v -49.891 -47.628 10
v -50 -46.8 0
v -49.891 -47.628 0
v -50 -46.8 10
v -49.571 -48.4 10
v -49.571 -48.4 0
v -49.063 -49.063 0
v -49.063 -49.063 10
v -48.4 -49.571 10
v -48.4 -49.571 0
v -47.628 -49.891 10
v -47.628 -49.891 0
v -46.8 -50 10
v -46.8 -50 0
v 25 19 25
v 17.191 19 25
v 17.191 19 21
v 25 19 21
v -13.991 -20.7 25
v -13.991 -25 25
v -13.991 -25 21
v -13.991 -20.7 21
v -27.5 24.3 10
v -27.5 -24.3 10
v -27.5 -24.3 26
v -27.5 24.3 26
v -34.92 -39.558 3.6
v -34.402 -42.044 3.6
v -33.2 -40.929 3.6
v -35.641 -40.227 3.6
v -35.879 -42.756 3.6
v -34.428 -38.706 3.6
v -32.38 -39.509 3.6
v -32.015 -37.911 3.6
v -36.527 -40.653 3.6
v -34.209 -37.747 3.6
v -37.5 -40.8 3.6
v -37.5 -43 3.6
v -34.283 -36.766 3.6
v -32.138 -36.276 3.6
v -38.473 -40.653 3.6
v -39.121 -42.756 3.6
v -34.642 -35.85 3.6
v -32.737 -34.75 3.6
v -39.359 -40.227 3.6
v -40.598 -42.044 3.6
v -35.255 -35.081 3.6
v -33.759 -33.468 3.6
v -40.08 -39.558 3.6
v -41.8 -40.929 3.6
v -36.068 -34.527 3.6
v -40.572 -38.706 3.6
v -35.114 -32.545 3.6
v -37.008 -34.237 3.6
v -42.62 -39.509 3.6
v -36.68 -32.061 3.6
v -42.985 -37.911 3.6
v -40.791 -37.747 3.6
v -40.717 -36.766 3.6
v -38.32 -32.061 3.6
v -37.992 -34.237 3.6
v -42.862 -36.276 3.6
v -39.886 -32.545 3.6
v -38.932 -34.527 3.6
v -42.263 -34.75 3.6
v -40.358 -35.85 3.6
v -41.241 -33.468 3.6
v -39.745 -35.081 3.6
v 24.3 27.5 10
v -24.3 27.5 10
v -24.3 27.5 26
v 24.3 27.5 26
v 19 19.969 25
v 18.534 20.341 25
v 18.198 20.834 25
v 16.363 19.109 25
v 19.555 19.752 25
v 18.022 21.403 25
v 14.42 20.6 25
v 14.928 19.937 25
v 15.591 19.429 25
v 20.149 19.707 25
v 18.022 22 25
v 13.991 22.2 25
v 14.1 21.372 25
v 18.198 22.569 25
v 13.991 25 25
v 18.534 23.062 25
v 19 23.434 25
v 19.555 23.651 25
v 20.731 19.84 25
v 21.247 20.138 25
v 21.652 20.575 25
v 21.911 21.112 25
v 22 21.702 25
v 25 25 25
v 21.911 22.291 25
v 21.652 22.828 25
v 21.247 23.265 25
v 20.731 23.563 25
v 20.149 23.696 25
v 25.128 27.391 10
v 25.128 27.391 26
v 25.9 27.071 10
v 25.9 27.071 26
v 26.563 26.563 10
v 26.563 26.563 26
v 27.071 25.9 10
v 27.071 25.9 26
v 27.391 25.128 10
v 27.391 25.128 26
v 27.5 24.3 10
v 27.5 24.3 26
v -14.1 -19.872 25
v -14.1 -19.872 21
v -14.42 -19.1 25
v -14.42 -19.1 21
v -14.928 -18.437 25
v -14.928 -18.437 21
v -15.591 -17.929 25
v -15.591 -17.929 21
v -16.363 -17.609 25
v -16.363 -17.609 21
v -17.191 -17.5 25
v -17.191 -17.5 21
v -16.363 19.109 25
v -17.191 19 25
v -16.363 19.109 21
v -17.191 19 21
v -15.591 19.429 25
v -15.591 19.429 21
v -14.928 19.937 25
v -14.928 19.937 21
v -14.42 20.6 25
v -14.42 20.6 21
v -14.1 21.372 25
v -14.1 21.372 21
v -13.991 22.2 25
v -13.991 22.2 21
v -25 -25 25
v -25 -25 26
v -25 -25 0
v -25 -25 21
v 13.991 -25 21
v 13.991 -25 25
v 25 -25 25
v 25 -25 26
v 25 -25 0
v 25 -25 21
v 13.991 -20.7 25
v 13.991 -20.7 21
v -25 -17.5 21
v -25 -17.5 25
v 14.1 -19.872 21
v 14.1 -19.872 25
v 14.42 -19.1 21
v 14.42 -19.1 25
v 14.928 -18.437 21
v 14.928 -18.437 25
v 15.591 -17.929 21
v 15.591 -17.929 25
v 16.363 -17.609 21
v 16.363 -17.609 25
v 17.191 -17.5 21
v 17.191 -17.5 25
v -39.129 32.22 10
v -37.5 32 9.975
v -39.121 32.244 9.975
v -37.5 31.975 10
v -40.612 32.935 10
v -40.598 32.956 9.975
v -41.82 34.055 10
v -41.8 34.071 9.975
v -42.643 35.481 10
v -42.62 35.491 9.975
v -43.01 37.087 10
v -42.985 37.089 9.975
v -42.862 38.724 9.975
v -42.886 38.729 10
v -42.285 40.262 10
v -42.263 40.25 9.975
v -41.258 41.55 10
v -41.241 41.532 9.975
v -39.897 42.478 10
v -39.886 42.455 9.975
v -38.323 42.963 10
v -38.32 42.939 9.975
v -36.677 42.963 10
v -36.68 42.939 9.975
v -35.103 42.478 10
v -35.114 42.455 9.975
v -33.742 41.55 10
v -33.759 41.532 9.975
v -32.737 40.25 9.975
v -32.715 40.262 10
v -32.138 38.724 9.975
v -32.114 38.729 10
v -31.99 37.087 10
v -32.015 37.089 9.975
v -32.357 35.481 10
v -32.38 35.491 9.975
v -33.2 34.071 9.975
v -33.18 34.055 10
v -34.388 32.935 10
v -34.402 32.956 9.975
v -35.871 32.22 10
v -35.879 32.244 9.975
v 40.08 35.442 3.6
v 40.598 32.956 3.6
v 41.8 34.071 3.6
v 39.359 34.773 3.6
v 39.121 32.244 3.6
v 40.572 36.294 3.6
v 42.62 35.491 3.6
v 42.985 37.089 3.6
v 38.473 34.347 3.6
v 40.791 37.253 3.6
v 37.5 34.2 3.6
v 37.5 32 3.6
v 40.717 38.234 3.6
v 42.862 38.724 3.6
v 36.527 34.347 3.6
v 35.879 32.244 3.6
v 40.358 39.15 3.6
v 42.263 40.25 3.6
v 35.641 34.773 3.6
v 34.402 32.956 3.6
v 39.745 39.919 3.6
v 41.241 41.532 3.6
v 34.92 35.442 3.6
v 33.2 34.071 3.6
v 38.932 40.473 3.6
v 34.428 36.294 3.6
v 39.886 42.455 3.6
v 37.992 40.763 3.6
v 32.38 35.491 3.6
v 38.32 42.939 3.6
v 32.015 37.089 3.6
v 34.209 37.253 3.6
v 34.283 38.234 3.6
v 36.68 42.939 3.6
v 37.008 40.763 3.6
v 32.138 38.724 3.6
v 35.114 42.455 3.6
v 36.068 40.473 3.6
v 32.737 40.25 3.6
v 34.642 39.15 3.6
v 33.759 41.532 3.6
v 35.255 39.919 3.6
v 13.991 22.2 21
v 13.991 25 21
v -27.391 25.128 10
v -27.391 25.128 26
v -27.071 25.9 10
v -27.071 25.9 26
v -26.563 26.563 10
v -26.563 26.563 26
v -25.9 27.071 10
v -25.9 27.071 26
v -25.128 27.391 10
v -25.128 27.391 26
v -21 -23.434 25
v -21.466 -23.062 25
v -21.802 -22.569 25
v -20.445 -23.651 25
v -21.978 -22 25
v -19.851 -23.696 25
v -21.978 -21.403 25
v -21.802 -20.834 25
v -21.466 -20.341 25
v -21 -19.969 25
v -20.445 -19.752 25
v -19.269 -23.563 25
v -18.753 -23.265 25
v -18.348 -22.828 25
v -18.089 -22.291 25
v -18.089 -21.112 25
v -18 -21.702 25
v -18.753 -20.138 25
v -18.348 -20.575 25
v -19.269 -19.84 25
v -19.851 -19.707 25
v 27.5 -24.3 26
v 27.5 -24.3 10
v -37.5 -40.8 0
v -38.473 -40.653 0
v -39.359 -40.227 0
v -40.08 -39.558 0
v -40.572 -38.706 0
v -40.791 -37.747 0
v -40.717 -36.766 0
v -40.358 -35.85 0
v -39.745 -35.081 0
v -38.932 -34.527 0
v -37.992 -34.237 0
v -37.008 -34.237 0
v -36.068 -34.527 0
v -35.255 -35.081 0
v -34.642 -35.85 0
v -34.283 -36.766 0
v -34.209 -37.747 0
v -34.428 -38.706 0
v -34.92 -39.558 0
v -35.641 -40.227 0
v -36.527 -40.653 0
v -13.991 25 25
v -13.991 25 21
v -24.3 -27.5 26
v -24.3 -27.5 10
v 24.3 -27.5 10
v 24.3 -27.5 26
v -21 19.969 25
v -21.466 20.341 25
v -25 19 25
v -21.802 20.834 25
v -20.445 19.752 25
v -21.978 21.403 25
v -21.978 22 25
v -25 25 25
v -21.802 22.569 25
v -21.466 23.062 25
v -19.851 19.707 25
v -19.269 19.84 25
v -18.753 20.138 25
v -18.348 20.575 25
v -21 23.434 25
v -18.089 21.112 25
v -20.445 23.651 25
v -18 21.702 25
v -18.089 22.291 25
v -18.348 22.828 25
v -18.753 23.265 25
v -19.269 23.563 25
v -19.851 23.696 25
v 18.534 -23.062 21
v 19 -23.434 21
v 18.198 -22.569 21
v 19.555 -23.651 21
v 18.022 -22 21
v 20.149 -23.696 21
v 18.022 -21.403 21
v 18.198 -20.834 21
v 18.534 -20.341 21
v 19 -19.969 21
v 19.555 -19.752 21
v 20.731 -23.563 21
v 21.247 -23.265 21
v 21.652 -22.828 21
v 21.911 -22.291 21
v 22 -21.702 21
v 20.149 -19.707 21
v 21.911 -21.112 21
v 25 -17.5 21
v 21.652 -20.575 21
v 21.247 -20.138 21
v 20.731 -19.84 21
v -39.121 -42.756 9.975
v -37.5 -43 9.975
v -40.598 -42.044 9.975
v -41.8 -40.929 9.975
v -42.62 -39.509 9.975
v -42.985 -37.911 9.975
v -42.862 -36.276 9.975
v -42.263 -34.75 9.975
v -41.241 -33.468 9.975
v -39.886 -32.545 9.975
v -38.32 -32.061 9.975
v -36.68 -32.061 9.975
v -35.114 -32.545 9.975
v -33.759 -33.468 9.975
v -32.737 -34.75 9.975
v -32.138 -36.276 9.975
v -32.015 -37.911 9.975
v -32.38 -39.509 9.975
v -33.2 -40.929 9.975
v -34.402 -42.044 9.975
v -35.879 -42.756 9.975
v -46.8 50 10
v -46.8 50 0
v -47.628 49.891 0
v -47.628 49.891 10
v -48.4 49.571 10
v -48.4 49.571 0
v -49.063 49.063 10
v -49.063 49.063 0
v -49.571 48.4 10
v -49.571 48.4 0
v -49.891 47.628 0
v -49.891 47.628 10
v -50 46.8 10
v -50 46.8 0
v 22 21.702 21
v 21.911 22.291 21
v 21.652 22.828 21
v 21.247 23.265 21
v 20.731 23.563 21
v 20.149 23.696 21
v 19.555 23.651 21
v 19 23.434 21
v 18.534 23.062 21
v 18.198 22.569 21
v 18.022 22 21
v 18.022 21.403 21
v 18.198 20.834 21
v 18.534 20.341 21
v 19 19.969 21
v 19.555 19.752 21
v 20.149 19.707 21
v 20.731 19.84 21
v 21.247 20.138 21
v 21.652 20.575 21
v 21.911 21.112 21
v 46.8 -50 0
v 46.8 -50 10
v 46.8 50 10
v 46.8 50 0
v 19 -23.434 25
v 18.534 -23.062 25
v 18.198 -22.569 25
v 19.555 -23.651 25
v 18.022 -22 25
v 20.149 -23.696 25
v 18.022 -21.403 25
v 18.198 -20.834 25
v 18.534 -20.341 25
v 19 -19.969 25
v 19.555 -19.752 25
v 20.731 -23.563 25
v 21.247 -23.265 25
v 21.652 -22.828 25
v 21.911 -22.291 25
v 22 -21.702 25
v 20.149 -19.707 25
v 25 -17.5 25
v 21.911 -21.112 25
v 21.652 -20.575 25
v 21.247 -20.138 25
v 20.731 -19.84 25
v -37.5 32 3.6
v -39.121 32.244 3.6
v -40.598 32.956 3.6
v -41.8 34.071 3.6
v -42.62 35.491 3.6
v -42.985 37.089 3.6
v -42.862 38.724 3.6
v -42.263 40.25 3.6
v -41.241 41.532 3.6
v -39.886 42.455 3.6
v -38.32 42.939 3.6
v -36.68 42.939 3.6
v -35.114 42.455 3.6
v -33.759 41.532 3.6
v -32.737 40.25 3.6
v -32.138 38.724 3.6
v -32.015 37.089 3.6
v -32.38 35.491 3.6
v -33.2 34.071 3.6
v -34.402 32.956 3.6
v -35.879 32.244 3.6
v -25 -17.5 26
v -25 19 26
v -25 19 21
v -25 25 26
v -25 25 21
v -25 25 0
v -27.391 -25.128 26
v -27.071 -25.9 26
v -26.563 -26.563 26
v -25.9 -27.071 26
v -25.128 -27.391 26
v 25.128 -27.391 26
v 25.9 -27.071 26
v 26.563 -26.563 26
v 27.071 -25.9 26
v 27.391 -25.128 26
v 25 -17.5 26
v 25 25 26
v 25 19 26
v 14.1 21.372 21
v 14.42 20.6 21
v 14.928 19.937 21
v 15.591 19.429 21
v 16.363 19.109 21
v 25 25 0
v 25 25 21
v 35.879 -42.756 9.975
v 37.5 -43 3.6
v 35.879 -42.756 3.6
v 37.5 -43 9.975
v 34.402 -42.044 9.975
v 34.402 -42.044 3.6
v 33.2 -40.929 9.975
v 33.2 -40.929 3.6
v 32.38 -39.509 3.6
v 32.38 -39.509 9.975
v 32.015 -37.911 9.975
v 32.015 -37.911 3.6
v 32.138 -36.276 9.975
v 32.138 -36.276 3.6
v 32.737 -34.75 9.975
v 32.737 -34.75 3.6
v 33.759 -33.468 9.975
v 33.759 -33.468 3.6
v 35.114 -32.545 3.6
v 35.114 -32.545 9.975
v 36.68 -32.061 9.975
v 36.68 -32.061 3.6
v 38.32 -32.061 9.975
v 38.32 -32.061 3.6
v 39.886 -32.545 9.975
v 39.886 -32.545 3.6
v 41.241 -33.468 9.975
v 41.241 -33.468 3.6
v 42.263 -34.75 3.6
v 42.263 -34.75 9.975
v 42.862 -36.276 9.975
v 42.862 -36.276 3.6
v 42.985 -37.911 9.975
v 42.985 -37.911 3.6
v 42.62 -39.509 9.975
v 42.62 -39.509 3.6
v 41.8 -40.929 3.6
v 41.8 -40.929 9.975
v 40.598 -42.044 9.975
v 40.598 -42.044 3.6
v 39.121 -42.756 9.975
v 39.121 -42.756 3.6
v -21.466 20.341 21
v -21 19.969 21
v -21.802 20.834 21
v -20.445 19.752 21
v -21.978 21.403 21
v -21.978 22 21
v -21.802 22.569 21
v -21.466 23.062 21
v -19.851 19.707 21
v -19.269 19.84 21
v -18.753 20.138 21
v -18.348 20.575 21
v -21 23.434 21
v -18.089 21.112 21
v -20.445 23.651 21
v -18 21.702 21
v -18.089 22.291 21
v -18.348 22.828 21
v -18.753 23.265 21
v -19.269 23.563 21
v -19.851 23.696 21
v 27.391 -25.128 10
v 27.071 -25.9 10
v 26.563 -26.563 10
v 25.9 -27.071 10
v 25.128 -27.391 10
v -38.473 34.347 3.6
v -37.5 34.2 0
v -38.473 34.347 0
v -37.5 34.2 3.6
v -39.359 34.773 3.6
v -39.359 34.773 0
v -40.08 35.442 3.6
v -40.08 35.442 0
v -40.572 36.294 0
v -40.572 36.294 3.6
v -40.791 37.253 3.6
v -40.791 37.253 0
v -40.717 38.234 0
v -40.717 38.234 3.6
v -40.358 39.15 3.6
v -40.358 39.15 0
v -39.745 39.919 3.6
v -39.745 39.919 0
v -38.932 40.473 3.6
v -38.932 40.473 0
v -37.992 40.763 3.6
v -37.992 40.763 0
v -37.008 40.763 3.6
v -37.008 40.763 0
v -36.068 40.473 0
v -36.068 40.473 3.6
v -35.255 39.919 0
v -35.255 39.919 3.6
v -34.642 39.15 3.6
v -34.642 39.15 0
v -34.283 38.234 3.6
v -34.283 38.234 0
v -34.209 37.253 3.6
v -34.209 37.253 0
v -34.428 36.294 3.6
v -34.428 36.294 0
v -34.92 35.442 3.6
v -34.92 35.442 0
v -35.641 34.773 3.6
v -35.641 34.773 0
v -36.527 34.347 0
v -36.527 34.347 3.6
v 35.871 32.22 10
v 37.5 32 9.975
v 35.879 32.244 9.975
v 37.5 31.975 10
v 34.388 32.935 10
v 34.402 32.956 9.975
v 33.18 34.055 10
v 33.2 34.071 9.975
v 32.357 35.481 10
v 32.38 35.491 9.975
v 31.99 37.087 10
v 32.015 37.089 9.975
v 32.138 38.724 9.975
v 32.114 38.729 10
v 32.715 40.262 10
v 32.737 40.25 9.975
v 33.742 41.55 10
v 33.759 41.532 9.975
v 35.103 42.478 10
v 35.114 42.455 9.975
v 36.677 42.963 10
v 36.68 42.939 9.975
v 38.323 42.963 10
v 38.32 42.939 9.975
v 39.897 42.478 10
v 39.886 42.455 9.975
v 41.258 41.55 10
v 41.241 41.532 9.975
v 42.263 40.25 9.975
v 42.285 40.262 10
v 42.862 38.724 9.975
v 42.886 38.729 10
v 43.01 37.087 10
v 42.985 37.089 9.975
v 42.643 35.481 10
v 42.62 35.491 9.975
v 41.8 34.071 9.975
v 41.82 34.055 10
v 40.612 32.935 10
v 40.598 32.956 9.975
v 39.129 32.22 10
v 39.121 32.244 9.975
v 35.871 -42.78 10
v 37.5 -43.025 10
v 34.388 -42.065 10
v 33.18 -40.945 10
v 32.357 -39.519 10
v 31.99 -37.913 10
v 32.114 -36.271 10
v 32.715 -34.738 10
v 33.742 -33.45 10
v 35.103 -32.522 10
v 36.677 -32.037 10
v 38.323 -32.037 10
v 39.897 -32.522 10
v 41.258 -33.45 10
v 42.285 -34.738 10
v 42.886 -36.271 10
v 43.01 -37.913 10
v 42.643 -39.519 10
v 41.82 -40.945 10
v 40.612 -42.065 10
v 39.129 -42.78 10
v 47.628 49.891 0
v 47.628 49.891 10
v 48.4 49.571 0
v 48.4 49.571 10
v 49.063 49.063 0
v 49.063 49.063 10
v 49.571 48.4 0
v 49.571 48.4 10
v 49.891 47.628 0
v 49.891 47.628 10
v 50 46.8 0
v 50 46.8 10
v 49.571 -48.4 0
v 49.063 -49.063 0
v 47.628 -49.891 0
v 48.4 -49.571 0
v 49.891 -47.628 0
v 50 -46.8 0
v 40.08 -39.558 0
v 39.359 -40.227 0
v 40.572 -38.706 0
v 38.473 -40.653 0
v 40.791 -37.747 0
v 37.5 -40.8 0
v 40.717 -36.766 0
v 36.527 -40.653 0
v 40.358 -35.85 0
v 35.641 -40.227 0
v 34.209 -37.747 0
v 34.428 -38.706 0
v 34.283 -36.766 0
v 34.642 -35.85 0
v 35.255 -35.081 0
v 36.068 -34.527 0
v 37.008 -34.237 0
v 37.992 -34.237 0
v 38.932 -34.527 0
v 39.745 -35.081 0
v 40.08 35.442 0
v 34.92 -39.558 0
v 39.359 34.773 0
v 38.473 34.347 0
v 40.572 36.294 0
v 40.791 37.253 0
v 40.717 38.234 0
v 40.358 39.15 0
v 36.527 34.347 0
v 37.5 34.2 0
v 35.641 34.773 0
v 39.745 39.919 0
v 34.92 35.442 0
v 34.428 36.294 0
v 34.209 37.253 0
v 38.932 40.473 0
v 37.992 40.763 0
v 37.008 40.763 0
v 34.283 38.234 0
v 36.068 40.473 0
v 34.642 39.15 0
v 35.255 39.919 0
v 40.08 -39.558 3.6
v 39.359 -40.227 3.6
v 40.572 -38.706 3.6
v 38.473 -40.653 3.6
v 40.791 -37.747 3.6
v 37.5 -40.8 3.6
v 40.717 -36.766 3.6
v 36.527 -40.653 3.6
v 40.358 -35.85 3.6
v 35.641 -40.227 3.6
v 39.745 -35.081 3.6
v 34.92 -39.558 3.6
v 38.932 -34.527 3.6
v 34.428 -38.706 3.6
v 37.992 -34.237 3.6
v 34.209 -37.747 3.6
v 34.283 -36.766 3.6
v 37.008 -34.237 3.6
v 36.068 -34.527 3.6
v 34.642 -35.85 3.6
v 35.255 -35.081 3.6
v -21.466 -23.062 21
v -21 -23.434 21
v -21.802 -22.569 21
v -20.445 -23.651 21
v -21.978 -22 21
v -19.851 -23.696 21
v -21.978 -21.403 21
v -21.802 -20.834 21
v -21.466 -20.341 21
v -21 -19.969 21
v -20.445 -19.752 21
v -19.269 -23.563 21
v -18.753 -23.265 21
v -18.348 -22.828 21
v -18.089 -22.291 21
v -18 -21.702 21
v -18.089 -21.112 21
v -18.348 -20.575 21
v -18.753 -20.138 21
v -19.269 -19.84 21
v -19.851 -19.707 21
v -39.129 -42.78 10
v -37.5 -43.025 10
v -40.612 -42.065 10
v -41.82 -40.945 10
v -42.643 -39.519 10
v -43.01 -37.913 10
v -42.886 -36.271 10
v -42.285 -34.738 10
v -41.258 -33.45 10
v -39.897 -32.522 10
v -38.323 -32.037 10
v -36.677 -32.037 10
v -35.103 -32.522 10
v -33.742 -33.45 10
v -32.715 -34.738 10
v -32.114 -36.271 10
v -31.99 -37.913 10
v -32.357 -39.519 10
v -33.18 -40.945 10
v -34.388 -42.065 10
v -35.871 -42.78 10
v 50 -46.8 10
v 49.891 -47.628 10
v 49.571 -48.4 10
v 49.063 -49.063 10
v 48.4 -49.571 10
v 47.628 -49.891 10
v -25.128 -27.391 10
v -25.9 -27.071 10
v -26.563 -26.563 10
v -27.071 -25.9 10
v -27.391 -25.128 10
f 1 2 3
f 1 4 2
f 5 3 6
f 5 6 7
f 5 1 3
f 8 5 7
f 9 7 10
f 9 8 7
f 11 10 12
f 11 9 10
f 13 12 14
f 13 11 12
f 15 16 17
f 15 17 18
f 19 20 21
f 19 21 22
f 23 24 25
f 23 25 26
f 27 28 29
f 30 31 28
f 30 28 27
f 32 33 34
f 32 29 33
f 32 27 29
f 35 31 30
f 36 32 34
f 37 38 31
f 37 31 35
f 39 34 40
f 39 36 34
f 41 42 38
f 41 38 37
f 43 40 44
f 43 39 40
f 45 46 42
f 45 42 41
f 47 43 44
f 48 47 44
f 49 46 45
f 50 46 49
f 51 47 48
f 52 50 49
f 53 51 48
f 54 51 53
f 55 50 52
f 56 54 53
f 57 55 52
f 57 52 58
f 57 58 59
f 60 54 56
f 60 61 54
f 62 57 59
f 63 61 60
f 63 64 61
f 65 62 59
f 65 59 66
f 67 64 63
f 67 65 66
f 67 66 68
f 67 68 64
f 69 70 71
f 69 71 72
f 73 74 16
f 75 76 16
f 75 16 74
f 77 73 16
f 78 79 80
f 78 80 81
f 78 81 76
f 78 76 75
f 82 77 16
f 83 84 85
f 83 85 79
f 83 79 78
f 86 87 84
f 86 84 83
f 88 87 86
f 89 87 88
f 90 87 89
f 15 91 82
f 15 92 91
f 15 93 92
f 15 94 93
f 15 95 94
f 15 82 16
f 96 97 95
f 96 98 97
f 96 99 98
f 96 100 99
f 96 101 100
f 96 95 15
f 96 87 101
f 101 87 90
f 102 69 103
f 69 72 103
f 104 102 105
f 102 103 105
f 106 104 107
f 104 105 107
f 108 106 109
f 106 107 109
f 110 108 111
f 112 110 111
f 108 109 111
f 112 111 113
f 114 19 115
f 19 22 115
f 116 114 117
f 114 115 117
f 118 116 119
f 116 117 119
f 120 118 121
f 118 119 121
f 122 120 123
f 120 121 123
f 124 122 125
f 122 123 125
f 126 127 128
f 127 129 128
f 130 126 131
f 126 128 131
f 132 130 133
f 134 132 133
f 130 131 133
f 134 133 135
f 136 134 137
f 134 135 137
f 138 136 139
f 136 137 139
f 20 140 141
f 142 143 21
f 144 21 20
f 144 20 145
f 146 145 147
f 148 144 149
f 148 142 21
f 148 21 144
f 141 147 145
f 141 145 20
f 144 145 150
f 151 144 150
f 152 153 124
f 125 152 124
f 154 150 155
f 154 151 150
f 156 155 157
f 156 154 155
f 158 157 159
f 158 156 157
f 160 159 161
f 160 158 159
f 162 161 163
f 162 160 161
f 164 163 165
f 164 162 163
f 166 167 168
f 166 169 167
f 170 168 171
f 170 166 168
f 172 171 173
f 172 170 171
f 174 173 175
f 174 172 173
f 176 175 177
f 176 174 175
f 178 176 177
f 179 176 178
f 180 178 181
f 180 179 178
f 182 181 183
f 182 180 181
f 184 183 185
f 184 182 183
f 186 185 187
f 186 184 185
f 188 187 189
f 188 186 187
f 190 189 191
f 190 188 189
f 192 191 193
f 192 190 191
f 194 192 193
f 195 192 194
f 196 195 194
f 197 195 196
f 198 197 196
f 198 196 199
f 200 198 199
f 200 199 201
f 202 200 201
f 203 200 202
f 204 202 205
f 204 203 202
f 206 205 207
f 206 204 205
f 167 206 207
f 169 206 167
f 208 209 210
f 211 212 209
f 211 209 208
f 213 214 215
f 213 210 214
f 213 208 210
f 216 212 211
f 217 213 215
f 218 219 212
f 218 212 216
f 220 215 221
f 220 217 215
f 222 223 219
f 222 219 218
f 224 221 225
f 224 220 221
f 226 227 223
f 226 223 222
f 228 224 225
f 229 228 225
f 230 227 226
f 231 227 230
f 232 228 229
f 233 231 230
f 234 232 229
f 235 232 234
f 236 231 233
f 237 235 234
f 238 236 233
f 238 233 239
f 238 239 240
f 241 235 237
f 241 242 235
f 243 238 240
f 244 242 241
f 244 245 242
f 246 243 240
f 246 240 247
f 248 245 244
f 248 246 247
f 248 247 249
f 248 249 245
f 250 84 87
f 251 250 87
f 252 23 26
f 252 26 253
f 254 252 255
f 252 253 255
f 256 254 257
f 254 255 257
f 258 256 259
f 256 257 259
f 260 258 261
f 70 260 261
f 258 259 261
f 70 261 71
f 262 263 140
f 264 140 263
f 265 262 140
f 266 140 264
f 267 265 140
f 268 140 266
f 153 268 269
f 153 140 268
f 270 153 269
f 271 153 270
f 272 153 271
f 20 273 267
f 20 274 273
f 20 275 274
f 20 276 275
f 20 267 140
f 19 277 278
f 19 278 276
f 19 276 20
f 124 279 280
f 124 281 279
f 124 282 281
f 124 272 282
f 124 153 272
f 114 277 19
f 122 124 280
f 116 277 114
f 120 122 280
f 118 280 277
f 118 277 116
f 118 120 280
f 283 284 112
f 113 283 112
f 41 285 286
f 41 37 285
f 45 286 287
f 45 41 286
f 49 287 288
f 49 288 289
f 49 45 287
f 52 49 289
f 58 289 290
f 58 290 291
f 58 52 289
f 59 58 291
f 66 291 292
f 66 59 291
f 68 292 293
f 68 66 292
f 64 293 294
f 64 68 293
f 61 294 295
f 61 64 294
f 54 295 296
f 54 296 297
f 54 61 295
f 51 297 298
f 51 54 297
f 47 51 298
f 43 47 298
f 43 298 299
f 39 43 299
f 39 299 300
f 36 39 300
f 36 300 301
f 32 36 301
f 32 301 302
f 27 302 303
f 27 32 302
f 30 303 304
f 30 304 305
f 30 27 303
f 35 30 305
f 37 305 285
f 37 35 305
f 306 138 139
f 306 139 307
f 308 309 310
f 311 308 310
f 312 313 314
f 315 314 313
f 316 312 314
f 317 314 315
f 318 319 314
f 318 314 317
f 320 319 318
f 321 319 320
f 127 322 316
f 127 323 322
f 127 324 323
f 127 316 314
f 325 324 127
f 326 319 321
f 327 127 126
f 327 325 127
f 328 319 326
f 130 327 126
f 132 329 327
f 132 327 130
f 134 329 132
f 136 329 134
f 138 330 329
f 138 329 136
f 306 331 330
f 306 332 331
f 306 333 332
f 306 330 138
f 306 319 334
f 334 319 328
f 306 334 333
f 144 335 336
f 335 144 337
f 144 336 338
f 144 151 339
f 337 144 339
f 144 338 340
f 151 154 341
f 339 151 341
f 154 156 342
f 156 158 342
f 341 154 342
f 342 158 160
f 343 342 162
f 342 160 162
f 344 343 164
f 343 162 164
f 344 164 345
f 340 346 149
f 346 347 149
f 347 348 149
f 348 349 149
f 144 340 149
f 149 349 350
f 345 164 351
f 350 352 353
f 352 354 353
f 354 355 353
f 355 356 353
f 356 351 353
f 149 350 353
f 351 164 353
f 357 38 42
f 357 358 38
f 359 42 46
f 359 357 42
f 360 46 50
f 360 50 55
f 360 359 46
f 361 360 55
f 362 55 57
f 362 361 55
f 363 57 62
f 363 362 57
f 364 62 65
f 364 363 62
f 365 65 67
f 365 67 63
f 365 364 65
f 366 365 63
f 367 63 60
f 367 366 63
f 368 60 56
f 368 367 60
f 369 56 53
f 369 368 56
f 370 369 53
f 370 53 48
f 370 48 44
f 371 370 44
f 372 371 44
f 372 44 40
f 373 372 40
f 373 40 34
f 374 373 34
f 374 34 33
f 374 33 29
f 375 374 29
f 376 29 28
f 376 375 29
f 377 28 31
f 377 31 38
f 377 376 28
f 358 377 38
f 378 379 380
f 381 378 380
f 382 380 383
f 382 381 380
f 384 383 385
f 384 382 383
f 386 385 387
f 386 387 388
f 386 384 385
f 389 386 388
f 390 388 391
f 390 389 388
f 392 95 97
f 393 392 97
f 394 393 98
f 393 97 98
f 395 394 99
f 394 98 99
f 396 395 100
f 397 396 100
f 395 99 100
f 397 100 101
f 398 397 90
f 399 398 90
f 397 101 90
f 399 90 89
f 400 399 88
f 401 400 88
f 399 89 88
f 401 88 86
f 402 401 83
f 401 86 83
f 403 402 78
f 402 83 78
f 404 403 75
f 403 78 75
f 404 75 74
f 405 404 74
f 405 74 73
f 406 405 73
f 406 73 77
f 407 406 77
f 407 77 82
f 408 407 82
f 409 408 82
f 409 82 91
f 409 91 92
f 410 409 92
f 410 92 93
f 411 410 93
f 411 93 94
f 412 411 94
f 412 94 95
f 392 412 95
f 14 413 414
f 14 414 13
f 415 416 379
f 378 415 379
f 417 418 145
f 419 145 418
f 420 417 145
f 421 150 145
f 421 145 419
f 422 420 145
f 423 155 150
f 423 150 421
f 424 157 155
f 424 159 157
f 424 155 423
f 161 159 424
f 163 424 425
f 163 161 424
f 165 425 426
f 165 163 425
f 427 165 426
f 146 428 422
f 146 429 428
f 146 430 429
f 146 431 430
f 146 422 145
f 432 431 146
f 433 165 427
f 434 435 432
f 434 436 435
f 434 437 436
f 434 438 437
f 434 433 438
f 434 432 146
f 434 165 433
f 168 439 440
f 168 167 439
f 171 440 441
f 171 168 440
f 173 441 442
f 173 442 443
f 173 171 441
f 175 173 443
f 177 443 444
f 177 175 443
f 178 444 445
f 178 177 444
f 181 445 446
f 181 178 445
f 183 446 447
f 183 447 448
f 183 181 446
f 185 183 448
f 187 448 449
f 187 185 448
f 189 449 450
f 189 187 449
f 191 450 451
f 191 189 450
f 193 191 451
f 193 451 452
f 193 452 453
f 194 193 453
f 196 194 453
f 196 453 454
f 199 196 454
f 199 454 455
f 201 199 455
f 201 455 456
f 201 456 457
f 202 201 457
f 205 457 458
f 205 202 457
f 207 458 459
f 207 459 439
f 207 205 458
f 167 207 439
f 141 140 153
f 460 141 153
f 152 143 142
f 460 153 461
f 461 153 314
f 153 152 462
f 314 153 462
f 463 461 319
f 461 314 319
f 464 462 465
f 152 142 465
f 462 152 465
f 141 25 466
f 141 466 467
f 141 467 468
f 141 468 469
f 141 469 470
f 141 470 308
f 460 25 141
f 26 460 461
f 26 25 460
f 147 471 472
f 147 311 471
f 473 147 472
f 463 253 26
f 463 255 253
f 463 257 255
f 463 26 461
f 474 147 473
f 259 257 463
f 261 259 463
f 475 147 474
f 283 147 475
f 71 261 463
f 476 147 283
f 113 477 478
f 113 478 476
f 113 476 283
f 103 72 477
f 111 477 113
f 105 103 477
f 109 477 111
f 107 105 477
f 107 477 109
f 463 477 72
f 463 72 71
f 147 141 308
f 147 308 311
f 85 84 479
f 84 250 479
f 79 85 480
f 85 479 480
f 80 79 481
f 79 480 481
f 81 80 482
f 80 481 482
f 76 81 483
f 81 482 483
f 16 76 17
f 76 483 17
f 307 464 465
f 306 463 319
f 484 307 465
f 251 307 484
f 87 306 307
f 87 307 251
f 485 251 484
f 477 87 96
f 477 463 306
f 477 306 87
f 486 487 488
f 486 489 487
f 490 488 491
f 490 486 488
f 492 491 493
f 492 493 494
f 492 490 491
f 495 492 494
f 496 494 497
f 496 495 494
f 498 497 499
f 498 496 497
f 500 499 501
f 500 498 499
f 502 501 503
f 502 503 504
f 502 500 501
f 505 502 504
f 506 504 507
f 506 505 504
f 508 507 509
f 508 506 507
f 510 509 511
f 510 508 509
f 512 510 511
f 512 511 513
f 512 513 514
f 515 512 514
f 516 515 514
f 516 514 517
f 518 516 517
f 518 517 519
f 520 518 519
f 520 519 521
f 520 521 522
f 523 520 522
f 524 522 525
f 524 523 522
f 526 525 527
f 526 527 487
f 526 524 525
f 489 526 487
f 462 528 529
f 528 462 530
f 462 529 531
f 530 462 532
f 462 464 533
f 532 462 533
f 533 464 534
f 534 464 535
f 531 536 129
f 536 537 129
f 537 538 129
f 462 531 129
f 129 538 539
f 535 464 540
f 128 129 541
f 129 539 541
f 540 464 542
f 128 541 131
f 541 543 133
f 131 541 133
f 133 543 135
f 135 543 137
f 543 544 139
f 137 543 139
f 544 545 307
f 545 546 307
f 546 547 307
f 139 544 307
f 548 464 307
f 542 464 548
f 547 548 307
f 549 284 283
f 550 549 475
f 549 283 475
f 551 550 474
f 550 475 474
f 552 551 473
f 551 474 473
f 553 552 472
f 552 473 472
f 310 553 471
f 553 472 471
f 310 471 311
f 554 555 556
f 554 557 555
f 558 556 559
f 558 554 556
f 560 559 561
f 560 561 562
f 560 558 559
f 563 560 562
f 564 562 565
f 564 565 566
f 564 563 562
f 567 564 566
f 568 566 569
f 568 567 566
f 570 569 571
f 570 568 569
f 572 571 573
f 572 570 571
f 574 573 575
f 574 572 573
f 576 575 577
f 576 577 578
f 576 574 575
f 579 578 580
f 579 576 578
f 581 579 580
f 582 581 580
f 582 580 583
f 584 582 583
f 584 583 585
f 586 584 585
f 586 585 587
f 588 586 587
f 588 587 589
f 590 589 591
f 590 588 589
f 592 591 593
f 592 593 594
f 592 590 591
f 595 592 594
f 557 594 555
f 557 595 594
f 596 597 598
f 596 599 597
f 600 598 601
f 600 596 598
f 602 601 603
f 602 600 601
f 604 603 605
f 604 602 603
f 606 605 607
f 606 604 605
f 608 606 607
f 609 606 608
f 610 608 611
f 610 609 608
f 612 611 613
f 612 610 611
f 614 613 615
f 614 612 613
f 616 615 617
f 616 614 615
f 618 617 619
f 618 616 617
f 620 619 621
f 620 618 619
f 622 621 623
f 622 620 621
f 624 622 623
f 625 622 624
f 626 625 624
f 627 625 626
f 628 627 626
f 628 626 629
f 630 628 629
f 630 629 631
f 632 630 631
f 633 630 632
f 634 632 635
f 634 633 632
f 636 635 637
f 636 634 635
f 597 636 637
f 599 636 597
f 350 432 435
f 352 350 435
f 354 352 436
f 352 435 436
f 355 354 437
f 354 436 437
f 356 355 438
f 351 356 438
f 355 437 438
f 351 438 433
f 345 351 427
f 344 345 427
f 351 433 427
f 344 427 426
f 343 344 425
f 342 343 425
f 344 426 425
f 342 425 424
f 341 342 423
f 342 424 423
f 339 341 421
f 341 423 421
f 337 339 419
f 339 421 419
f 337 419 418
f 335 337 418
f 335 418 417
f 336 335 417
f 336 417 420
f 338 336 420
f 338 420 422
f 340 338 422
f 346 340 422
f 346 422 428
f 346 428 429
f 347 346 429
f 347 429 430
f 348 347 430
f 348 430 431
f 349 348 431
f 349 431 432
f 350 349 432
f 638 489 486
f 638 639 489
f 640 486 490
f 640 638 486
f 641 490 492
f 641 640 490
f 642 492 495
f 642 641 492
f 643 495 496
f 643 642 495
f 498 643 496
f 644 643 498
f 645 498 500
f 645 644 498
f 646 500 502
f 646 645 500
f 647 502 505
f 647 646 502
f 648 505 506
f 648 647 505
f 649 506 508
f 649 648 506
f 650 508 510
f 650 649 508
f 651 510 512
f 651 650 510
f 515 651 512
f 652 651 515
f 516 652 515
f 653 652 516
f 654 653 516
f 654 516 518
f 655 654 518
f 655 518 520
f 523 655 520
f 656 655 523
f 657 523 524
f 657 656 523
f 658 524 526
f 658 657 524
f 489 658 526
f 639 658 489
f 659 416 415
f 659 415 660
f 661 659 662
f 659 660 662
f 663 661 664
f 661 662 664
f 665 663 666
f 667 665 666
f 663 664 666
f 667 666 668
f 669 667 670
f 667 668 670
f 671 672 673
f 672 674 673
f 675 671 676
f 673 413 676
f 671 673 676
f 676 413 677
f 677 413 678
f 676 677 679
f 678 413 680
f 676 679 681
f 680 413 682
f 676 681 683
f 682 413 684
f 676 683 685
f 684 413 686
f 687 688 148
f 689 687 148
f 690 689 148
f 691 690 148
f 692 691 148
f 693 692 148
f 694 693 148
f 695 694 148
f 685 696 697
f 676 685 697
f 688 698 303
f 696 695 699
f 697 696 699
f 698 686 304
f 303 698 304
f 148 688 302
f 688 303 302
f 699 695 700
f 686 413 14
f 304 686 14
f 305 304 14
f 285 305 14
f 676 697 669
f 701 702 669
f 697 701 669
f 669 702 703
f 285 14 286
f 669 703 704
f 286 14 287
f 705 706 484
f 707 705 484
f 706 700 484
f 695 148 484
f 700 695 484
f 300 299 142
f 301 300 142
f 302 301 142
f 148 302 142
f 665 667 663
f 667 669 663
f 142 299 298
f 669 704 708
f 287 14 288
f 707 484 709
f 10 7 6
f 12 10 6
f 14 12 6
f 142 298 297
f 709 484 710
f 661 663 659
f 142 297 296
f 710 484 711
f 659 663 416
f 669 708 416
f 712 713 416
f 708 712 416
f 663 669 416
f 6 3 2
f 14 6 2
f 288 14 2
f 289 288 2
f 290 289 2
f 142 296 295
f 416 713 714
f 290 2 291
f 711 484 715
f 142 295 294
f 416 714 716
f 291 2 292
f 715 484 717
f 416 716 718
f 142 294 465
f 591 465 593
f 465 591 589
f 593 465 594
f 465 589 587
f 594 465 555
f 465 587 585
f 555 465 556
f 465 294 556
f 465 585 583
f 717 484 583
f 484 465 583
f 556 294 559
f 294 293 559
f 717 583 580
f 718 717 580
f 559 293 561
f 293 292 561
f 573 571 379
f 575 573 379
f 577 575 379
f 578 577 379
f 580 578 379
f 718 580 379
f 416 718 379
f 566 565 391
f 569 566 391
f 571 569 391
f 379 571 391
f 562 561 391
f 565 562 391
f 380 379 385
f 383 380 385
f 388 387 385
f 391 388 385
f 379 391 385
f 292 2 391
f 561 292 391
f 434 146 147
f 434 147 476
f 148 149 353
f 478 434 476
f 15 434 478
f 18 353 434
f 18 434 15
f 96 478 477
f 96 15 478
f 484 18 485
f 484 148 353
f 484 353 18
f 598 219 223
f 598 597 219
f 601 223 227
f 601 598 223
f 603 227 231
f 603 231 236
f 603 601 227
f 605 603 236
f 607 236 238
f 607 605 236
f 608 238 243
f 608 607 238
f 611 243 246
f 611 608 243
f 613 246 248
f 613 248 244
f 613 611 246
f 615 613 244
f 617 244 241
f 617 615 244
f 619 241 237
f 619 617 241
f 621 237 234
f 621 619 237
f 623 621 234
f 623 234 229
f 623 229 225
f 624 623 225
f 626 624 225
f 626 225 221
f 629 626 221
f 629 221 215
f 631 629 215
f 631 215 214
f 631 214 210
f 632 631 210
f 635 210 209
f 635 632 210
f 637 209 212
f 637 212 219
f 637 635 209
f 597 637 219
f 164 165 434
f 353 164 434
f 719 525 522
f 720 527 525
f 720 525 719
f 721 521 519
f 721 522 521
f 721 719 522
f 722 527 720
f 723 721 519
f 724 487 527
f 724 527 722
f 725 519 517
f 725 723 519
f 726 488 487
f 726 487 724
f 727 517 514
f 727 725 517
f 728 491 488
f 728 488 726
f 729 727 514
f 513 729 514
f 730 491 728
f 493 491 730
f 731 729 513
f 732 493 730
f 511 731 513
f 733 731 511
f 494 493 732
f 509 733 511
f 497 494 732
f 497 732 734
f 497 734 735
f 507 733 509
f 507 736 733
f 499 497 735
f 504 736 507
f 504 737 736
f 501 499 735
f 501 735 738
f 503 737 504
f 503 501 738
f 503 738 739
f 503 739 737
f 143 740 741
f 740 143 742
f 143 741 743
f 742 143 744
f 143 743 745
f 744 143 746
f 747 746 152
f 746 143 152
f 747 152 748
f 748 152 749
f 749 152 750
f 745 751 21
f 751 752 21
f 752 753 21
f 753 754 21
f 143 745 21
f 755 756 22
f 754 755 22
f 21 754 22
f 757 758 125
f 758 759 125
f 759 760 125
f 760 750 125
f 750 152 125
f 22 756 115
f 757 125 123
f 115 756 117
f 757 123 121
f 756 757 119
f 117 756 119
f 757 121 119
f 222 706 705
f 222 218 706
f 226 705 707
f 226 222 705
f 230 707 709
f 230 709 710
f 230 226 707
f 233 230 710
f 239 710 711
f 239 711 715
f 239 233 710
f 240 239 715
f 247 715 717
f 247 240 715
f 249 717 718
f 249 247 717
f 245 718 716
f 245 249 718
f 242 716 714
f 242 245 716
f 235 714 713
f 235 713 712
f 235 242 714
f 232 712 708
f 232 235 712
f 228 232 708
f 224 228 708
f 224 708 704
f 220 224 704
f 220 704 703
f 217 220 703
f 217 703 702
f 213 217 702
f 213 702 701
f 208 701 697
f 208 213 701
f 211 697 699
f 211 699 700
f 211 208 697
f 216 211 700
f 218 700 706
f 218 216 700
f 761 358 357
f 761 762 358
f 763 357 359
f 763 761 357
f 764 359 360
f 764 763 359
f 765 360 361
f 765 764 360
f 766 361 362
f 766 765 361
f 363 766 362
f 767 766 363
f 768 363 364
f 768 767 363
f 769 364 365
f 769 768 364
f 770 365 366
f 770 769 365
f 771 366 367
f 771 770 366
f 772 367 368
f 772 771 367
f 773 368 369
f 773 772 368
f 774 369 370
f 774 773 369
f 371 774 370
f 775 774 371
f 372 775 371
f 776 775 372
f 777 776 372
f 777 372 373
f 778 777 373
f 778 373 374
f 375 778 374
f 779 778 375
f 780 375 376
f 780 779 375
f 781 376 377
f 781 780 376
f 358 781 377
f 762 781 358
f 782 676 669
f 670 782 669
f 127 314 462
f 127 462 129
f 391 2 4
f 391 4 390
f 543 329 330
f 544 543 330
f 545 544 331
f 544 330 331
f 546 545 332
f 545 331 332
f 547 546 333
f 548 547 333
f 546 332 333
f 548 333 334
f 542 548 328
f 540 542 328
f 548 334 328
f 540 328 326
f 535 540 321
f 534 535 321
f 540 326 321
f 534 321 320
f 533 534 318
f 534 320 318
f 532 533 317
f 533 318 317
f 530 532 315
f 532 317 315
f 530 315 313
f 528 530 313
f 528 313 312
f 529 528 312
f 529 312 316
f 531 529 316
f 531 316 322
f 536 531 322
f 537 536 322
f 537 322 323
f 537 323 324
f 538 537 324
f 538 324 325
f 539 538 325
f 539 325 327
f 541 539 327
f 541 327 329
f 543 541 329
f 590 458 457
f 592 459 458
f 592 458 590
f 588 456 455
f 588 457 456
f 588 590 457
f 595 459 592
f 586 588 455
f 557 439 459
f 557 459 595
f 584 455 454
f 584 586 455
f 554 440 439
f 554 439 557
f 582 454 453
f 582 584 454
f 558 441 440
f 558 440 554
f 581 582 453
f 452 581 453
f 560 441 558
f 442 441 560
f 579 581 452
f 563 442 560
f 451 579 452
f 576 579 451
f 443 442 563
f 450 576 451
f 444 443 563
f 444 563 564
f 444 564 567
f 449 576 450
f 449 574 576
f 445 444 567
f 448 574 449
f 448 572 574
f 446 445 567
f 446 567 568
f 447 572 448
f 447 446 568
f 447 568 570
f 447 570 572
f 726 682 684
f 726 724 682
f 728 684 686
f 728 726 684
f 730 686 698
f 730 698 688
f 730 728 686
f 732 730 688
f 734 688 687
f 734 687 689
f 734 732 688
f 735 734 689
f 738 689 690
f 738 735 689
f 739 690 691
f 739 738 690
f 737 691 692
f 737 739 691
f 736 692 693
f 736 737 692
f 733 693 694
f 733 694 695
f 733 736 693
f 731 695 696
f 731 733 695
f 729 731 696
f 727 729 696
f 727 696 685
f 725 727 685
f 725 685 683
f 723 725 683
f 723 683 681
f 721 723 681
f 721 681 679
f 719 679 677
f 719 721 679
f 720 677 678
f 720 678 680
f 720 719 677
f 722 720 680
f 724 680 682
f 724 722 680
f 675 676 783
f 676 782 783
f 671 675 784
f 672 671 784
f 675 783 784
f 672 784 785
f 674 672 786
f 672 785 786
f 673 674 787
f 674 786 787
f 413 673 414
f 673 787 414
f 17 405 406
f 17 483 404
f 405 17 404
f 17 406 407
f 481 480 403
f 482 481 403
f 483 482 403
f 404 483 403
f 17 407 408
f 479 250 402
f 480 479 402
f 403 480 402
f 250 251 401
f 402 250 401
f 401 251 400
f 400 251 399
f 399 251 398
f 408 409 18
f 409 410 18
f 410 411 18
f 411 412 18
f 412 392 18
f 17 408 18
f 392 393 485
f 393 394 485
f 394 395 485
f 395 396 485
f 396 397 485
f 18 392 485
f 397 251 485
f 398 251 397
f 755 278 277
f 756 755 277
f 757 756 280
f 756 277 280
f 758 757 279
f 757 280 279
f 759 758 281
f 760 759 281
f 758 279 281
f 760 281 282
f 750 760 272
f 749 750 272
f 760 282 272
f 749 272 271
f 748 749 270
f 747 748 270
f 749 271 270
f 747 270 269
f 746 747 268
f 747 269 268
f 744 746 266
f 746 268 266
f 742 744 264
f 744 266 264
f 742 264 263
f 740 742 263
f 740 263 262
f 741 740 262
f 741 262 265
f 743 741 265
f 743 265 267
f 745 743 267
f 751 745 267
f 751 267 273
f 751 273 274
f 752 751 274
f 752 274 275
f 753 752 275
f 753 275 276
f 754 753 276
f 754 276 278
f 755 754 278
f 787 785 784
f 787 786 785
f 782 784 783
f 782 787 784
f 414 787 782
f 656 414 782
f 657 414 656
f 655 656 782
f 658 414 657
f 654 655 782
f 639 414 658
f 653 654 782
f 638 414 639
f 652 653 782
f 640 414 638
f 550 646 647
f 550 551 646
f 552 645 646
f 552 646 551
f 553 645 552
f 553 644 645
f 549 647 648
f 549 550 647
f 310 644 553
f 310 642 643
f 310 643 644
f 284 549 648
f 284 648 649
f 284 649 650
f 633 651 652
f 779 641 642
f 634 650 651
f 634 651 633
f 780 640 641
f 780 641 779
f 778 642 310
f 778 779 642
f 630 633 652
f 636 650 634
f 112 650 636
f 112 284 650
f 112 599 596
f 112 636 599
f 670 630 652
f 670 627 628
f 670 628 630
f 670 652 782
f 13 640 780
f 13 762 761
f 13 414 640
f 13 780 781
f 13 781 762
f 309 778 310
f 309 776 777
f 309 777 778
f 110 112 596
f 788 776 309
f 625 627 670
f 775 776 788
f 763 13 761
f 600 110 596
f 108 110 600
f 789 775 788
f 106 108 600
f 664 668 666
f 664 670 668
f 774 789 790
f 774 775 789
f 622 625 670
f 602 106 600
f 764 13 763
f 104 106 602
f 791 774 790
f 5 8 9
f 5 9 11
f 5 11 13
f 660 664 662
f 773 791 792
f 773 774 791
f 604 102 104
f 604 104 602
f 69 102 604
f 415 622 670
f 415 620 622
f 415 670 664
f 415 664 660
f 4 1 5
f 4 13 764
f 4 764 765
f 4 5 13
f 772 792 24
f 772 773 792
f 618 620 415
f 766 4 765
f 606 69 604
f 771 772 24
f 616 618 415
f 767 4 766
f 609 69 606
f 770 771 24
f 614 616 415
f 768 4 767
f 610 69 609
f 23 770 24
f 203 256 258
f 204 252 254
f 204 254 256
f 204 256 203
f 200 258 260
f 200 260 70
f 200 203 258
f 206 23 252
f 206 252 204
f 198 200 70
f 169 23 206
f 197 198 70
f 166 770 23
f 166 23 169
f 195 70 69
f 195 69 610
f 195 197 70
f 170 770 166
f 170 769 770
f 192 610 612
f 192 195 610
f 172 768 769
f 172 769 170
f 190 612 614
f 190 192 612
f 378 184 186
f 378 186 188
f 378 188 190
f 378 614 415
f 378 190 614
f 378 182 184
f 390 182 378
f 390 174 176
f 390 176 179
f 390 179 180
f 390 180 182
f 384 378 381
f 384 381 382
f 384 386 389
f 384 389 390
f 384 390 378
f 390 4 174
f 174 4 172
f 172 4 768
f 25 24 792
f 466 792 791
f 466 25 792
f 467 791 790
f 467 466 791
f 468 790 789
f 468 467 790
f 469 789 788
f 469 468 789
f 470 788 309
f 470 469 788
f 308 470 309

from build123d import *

# Parameters (mm, degrees)
SKETCH2_W                                    = 100
SKETCH2_H                                    = 100
SKETCH2_W_2                                  = 50
SKETCH2_H_2                                  = 50
BOSS_EXTRUDE1_DEPTH                          = 10
CBORE_FOR_M6_HEX_SOCKET_HEAD_CAP_SCR_2_COUNT = 2
CBORE_FOR_M6_HEX_SOCKET_HEAD_CAP_SCR_2_PITCH = 75
CBORE_FOR_M6_HEX_SOCKET_HEAD_CAP_SCR_3_COUNT = 2
CBORE_FOR_M6_HEX_SOCKET_HEAD_CAP_SCR_3_PITCH = 106.066017178
CBORE_FOR_M6_HEX_SOCKET_HEAD_CAP_SCR_4_COUNT = 2
CBORE_FOR_M6_HEX_SOCKET_HEAD_CAP_SCR_4_PITCH = 75
SKETCH7_W                                    = 55
SKETCH7_H                                    = 55
SKETCH7_W_2                                  = 50
SKETCH7_H_2                                  = 50
BOSS_EXTRUDE2_DEPTH                          = 16
SKETCH8_W                                    = 11.008814293
SKETCH8_H                                    = 6
SKETCH8_R                                    = 2
SKETCH8_H_2                                  = 7.5
BOSS_EXTRUDE3_DEPTH                          = 5
SKETCH9_W                                    = 11.008814293
SKETCH9_H                                    = 7.5
SKETCH9_R                                    = 2
SKETCH9_H_2                                  = 6
CUT_EXTRUDE1_DEPTH                           = 1
FILLET1_R                                    = 3.2


with BuildPart() as part:
    # Sketch2 → Boss-Extrude1 (new body)
    with BuildSketch(Plane(origin=(0, 0, 0), x_dir=(0, 1, 0), z_dir=(0, 0, 1))):
        Rectangle(SKETCH2_W, SKETCH2_H)
        Rectangle(SKETCH2_W_2, SKETCH2_H_2, mode=Mode.SUBTRACT)
    extrude(amount=BOSS_EXTRUDE1_DEPTH)

    # Sketch6 → CBORE for M6 Hex Socket Head Cap Screw1 (revolve, cut)
    with BuildSketch(Plane(origin=(-37.5, 37.5, 10), x_dir=(0, -1, 0), z_dir=(1, 0, 0))):
        Polygon((0, 0), (0, 10), (3.3, 10), (3.3, 6.4), (5.5, 6.4), (5.5, 0.025), (5.525, 0), align=None)
    cbore_for_m6_hex_socket_head_cap_screw1 = revolve(axis=Axis((-37.5, 37.5, 16.35), (0, 0, -1)), mode=Mode.SUBTRACT)

    # CBORE for M6 Hex Socket Head Cap Scr 2: CBORE for M6 Hex Socket Head Cap Screw1 ×2
    with Locations(*[(i * CBORE_FOR_M6_HEX_SOCKET_HEAD_CAP_SCR_2_PITCH, 0, 0) for i in range(1, CBORE_FOR_M6_HEX_SOCKET_HEAD_CAP_SCR_2_COUNT)]):
        add(cbore_for_m6_hex_socket_head_cap_screw1, mode=Mode.SUBTRACT)

    # CBORE for M6 Hex Socket Head Cap Scr 3: CBORE for M6 Hex Socket Head Cap Screw1 ×2
    with Locations(*[Vector(0.7071067811865477, -0.7071067811865475, 0) * (i * CBORE_FOR_M6_HEX_SOCKET_HEAD_CAP_SCR_3_PITCH) for i in range(1, CBORE_FOR_M6_HEX_SOCKET_HEAD_CAP_SCR_3_COUNT)]):
        add(cbore_for_m6_hex_socket_head_cap_screw1, mode=Mode.SUBTRACT)

    # CBORE for M6 Hex Socket Head Cap Scr 4: CBORE for M6 Hex Socket Head Cap Screw1 ×2
    with Locations(*[(0, -i * CBORE_FOR_M6_HEX_SOCKET_HEAD_CAP_SCR_4_PITCH, 0) for i in range(1, CBORE_FOR_M6_HEX_SOCKET_HEAD_CAP_SCR_4_COUNT)]):
        add(cbore_for_m6_hex_socket_head_cap_screw1, mode=Mode.SUBTRACT)

    # Sketch7 → Boss-Extrude2 (add)
    with BuildSketch(Plane.XY.offset(10)):
        Rectangle(SKETCH7_W, SKETCH7_H)
        Rectangle(SKETCH7_W_2, SKETCH7_H_2, mode=Mode.SUBTRACT)
    extrude(amount=BOSS_EXTRUDE2_DEPTH)

    # Sketch8 → Boss-Extrude3 (add)
    # profile 1 of 4: a face of its own
    with BuildSketch(Plane.XY.offset(26)):
        with Locations((-19.495592853, 22)):
            Rectangle(SKETCH8_W, SKETCH8_H)
        with Locations((-20, 21.7015)):
            Circle(SKETCH8_R, mode=Mode.SUBTRACT)
    # profile 2 of 4: a face of its own
    with BuildSketch(Plane.XY.offset(26)):
        with Locations((19.495592853, 22)):
            Rectangle(SKETCH8_W, SKETCH8_H)
        with Locations((20, 21.7015)):
            Circle(SKETCH8_R, mode=Mode.SUBTRACT)
    # profile 3 of 4: a face of its own
    with BuildSketch(Plane.XY.offset(26)):
        with Locations((19.495592853, -21.25)):
            Rectangle(SKETCH8_W, SKETCH8_H_2)
        with Locations((20, -21.7015)):
            Circle(SKETCH8_R, mode=Mode.SUBTRACT)
    # profile 4 of 4: a face of its own
    with BuildSketch(Plane.XY.offset(26)):
        with Locations((-19.495592853, -21.25)):
            Rectangle(SKETCH8_W, SKETCH8_H_2)
        with Locations((-20, -21.7015)):
            Circle(SKETCH8_R, mode=Mode.SUBTRACT)
    extrude(amount=-BOSS_EXTRUDE3_DEPTH)

    # Sketch9 → Cut-Extrude1 (cut)
    # profile 1 of 4: a face of its own
    with BuildSketch(Plane.XY.offset(26)):
        with Locations((-19.495592853, -21.25)):
            Rectangle(SKETCH9_W, SKETCH9_H)
        with Locations((-20, -21.7015)):
            Circle(SKETCH9_R, mode=Mode.SUBTRACT)
    # profile 2 of 4: a face of its own
    with BuildSketch(Plane.XY.offset(26)):
        with Locations((19.495592853, -21.25)):
            Rectangle(SKETCH9_W, SKETCH9_H)
    # profile 3 of 4: a face of its own
    with BuildSketch(Plane.XY.offset(26)):
        with Locations((19.495592853, 22)):
            Rectangle(SKETCH9_W, SKETCH9_H_2)
    # profile 4 of 4: a face of its own
    with BuildSketch(Plane.XY.offset(26)):
        with Locations((-19.495592853, 22)):
            Rectangle(SKETCH9_W, SKETCH9_H_2)
    extrude(amount=-CUT_EXTRUDE1_DEPTH, mode=Mode.SUBTRACT)

    # Fillet1
    fillet1_edges = [part.edges().sort_by_distance(p)[0] for p in [
        (-13.991185707, -17.5, 23),
        (13.991185707, -17.5, 23),
        (13.991185707, 19, 23),
        (-13.991185707, 19, 23),
        (-27.5, -27.5, 18),
        (27.5, -27.5, 18),
        (27.5, 27.5, 18),
        (50, -50, 5),
        (-27.5, 27.5, 18),
        (-50, -50, 5),
        (-50, 50, 5),
        (50, 50, 5),
    ]]
    fillet(fillet1_edges, radius=FILLET1_R)


solid = part.part
